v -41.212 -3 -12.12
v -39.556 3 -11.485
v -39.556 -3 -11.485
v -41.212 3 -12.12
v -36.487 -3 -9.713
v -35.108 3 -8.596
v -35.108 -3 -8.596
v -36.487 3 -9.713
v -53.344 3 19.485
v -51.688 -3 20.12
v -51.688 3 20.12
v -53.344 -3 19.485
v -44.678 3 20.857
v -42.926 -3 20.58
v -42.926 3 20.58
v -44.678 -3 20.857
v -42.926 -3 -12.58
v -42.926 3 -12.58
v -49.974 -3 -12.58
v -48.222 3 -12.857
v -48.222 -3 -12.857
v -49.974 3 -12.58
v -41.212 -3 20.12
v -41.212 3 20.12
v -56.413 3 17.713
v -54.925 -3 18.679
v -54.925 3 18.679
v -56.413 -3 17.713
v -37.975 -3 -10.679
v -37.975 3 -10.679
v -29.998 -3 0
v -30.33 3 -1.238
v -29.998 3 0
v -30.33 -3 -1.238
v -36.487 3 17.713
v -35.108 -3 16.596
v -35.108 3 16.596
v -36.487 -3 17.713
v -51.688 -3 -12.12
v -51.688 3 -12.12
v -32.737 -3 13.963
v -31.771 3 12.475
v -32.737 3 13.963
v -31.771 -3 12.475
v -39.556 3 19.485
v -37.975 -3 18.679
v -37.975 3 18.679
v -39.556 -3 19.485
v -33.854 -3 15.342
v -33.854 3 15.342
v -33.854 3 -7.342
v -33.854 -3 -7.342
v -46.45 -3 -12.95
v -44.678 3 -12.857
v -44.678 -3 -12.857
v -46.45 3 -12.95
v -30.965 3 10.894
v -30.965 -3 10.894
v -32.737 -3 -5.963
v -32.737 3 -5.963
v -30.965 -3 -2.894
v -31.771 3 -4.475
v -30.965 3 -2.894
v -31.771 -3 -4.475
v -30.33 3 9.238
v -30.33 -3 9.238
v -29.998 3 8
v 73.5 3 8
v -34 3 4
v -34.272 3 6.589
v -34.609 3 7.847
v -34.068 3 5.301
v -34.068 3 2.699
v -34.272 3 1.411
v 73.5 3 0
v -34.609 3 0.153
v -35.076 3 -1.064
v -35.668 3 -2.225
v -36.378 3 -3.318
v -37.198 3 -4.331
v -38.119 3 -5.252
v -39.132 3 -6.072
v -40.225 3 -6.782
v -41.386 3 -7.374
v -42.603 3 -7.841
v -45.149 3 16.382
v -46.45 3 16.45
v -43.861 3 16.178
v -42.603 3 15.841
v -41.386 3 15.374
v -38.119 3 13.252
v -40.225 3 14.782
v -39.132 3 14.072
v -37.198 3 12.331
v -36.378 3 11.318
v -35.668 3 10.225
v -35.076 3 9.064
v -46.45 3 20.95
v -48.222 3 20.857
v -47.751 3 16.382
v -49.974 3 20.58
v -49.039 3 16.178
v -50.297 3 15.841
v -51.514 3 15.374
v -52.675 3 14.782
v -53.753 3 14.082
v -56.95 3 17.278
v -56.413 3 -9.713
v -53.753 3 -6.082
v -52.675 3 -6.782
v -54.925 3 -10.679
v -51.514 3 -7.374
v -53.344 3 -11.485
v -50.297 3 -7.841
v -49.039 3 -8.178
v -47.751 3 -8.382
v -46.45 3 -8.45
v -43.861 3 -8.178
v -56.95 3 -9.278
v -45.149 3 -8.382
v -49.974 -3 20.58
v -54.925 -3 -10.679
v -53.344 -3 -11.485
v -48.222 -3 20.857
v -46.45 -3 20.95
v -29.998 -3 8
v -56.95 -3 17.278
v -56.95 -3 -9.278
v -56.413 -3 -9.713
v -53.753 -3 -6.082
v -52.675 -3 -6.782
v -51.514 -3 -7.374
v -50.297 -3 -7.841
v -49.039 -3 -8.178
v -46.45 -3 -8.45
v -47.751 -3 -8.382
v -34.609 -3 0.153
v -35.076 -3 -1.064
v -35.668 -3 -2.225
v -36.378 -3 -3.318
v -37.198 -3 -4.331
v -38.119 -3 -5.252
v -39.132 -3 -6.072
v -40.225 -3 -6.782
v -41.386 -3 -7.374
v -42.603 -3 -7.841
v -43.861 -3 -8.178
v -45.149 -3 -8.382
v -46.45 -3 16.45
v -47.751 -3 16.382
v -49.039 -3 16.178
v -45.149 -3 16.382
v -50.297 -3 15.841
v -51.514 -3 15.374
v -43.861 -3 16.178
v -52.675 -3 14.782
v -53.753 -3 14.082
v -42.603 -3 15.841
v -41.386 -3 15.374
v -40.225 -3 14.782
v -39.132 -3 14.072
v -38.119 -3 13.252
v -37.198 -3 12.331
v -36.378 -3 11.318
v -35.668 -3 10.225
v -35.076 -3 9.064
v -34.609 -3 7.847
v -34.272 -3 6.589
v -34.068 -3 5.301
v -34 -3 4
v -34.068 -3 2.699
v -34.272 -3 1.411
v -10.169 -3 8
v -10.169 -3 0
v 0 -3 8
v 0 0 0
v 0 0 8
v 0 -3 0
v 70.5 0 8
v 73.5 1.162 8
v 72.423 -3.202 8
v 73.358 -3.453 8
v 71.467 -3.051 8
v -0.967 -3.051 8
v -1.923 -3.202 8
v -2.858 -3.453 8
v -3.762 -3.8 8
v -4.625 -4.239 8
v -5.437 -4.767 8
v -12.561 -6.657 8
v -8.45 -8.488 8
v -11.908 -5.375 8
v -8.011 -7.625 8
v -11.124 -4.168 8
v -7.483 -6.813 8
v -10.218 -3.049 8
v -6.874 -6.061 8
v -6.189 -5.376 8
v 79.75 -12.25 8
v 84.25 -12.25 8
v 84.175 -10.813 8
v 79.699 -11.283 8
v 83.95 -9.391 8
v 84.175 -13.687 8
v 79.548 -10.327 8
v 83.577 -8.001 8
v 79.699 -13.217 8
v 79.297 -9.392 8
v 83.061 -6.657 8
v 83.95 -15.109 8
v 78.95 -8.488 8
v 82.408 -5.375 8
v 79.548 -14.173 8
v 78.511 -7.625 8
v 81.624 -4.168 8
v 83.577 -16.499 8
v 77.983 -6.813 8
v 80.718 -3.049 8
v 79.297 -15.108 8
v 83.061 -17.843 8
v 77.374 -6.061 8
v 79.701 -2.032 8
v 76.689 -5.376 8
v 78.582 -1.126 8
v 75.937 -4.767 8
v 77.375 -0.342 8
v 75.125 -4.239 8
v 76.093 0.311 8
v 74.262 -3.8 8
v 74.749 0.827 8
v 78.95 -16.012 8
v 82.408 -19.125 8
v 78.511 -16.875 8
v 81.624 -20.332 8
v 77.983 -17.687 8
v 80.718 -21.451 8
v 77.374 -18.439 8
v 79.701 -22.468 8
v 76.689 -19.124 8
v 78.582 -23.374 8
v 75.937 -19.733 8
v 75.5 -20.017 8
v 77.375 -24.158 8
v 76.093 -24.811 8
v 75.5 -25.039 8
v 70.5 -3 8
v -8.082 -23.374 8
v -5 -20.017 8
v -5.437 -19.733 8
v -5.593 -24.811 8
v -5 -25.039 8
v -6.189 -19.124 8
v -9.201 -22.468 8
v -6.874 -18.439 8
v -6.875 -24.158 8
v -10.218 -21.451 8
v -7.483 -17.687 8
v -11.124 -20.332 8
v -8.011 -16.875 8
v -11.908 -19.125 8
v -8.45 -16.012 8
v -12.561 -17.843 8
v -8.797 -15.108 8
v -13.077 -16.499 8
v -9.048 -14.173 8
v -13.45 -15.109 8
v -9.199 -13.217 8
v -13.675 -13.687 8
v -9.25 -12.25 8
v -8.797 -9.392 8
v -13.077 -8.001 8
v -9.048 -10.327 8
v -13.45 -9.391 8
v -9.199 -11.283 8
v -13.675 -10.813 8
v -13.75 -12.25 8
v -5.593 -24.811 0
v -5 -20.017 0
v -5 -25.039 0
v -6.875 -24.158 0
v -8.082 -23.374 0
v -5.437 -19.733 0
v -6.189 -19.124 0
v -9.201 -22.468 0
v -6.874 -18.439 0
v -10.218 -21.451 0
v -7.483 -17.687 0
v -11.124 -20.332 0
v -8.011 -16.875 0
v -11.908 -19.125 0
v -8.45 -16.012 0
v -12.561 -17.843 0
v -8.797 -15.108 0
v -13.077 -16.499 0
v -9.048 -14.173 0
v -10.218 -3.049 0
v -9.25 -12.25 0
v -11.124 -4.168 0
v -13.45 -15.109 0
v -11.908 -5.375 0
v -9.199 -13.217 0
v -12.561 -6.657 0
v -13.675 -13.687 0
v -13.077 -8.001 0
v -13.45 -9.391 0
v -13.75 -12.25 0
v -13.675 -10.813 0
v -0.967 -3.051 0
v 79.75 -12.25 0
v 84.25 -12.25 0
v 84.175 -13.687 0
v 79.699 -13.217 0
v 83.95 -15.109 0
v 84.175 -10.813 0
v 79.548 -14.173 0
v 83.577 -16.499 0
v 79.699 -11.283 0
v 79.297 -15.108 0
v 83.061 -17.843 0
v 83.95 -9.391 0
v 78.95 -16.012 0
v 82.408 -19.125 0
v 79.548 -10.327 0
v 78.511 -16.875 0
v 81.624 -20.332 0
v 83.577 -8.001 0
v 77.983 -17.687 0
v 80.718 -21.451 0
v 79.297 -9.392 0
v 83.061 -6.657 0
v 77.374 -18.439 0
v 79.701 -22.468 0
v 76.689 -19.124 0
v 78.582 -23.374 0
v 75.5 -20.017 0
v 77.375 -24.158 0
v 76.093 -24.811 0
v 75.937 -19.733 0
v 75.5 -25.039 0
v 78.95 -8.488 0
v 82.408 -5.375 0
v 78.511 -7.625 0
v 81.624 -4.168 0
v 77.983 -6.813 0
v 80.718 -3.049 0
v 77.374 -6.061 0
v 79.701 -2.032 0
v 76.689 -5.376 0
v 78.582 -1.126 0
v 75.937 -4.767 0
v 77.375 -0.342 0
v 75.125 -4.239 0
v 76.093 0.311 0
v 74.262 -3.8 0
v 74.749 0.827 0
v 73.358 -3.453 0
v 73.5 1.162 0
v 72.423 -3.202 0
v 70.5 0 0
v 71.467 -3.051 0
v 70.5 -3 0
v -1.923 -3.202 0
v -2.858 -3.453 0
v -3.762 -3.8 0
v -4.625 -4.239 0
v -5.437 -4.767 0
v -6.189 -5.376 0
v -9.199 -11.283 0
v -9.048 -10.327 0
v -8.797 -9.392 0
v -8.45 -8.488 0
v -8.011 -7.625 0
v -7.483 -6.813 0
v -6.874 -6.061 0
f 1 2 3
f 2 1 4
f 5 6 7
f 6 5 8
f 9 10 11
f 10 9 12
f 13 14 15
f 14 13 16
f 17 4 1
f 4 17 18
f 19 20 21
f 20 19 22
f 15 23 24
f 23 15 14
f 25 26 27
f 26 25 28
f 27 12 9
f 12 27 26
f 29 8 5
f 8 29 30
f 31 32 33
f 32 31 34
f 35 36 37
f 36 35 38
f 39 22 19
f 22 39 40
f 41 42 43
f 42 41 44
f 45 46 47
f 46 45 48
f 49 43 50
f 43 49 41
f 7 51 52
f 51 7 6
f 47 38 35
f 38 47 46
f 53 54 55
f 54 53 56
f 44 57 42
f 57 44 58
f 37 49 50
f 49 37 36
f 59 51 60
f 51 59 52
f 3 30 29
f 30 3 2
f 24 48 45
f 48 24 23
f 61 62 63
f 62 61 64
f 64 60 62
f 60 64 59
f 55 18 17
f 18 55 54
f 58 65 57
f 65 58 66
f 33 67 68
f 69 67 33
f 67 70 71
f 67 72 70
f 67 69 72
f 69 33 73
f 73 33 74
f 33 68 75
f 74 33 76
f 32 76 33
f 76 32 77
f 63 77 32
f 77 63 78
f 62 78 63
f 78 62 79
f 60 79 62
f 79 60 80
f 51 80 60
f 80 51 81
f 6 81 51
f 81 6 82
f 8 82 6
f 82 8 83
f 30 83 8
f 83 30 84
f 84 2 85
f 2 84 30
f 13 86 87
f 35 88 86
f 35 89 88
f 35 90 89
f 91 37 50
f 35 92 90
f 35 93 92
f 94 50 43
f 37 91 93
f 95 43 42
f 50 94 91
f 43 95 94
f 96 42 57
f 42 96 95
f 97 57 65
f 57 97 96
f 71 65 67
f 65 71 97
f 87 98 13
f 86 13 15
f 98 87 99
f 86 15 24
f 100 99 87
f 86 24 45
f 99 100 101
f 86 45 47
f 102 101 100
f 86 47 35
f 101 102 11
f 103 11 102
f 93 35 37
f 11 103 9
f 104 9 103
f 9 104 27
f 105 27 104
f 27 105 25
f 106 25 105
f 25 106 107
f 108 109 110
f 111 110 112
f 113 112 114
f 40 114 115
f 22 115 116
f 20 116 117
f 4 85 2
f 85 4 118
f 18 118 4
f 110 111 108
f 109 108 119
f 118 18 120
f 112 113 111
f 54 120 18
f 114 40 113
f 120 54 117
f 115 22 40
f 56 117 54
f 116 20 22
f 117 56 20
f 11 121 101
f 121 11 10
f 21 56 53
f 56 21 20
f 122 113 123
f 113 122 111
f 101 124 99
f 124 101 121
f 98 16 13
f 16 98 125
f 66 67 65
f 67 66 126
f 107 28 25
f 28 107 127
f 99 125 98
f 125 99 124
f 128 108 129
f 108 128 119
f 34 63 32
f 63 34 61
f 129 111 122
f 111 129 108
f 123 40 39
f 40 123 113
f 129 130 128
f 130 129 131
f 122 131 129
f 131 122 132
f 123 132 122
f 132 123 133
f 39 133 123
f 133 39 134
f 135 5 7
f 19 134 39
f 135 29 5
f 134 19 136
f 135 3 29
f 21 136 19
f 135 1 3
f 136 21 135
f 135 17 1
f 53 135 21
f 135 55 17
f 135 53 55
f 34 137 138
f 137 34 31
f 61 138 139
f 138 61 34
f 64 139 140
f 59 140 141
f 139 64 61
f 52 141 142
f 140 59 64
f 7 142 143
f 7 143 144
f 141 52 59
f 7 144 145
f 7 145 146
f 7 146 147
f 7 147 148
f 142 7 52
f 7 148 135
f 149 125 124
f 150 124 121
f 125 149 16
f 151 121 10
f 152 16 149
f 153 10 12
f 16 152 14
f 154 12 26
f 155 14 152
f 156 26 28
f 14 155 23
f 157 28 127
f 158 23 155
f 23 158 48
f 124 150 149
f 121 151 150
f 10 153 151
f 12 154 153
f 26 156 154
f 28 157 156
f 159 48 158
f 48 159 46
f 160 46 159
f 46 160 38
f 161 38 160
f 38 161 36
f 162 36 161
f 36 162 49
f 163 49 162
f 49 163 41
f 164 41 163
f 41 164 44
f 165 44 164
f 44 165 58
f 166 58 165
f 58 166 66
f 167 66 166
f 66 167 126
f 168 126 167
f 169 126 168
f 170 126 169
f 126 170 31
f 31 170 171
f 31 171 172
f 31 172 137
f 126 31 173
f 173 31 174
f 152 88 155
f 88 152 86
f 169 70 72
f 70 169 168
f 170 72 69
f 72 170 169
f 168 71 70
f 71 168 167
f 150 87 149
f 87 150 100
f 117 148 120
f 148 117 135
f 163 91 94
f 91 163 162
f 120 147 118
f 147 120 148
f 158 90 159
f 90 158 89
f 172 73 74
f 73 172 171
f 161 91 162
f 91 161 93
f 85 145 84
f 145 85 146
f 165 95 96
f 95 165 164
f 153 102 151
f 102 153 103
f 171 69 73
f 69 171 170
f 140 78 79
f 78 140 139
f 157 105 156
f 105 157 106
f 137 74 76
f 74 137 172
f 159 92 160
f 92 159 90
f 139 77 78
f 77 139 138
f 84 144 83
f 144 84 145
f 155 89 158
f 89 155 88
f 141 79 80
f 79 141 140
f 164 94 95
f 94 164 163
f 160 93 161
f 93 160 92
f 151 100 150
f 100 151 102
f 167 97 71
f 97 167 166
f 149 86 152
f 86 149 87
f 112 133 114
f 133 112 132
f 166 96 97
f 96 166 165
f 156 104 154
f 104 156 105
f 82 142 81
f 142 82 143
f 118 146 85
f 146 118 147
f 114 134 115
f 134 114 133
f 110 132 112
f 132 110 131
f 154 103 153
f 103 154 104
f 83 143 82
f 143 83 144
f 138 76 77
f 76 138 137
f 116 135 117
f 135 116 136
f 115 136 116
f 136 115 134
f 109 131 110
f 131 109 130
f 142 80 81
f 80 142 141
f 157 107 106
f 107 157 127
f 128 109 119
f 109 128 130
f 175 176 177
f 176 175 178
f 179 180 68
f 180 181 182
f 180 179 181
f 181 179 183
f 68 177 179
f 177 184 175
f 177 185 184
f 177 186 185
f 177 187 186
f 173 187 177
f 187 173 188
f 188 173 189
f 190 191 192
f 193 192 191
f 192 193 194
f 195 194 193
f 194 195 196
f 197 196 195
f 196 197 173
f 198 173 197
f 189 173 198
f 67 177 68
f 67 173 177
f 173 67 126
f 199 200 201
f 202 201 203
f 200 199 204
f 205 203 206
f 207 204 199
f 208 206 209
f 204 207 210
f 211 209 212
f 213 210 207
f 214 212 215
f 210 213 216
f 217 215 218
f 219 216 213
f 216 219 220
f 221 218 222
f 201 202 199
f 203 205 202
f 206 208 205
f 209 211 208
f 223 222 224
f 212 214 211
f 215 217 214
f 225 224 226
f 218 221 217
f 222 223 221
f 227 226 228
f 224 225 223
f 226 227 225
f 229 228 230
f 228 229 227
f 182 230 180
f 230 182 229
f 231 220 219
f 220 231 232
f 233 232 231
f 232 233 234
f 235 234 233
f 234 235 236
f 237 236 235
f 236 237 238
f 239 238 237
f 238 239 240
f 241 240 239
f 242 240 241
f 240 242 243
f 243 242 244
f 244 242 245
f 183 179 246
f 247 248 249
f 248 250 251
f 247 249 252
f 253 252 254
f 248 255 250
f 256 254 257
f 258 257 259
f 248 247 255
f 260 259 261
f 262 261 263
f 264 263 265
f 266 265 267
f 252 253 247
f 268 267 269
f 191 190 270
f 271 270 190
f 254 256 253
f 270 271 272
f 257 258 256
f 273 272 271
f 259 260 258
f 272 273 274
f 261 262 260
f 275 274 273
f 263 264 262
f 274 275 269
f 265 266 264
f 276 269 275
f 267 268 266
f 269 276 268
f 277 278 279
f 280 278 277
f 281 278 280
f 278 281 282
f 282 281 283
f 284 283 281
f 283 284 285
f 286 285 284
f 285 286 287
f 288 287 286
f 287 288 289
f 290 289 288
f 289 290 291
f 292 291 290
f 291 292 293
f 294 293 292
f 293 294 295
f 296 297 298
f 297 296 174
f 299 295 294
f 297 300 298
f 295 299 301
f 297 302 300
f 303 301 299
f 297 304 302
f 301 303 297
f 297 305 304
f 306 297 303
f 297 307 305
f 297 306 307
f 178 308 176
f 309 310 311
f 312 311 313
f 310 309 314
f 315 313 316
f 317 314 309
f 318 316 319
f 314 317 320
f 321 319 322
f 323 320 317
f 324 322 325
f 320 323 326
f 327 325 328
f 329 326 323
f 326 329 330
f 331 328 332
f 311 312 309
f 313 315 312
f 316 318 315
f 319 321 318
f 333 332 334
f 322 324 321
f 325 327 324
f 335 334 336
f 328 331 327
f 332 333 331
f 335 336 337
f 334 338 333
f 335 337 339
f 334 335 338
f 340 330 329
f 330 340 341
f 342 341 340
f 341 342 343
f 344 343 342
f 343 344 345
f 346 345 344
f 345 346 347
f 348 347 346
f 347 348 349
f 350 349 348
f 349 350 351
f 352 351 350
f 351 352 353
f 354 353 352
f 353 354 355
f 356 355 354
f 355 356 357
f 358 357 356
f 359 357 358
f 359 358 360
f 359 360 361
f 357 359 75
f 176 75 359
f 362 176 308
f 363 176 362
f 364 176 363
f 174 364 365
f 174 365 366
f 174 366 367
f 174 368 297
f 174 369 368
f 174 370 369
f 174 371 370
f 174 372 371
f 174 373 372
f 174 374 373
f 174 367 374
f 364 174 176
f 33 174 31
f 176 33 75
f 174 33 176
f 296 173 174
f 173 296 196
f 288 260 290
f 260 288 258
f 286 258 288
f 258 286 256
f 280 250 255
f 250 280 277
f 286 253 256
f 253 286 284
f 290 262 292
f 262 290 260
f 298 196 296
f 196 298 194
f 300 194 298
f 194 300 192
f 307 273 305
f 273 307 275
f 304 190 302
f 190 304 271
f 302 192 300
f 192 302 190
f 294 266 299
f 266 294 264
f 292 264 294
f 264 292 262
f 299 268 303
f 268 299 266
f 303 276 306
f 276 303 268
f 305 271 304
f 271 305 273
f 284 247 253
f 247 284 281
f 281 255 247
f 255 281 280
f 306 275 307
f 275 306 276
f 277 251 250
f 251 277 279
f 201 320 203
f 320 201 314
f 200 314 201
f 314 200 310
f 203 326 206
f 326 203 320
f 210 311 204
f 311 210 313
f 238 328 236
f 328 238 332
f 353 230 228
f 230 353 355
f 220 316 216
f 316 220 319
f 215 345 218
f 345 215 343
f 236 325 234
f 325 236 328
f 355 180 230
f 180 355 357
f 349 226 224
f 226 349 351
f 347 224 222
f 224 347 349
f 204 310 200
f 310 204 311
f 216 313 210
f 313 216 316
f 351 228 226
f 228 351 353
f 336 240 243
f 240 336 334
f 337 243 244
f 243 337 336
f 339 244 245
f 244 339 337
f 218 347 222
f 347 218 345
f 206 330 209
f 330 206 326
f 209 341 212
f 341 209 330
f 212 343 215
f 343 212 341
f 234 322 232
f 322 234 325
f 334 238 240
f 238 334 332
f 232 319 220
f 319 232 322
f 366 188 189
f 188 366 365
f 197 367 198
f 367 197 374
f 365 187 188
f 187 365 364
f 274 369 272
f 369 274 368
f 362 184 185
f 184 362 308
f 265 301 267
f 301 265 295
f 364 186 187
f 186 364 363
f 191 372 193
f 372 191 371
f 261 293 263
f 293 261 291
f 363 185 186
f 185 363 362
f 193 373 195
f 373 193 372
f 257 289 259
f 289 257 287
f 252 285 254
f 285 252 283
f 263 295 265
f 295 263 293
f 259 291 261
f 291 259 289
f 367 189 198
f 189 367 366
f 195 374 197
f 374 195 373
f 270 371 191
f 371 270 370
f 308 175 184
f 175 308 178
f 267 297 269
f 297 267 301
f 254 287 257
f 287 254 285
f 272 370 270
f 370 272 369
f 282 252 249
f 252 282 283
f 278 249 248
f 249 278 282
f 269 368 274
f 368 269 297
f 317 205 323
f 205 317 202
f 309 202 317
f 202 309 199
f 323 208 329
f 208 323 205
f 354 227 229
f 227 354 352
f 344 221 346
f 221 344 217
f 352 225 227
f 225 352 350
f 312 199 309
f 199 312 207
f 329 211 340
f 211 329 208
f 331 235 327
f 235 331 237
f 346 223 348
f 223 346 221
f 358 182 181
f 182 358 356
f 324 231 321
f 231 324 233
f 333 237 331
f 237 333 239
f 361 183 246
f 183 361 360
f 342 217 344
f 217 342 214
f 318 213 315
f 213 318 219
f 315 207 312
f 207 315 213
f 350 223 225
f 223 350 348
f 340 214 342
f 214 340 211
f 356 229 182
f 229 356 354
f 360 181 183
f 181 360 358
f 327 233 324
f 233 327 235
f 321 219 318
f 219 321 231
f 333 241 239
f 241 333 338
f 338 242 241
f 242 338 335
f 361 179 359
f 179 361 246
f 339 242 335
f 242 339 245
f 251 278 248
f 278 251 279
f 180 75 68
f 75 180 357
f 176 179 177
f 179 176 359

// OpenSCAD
thickness = 3;
depth = 8;
latch = 5;
arm = 28;
lights = 6;
//handle = 28.25; (broom w/rubber handle)
handle = 24.9;
$fn = 60;
// This is the arm/accessory section
translate([-(arm+lights),-thickness,0]){
//union(){
cube([arm+lights,2*thickness,depth]);
rotate([90,0,0]){
translate([-handle/2,depth/2,-2*thickness]){
difference(){
cylinder(d=handle+3*thickness, h= 2*thickness);
translate([0,0,-.5]){
cylinder(d=handle,h=2*thickness+1);
}

translate([-(handle+thickness+3),-(handle+thickness)/2,-.5]){
//cube([handle+thickness,handle+thickness,2*thickness+1]);
translate([(handle+thickness)/2,(handle+thickness)/2,0]){
rotate([0,0,45]){
translate([-(handle+thickness)/2,-(handle+thickness)/2,0]){
cube([handle+thickness,handle+thickness,2*thickness+1]);
}
}
}
}
}
}
}
//cylinder(d=lights+thickness,h=depth);
//}
//translate([0,0,-1]){
//cylinder(d=lights,h=depth+2);
//translate([0,0,0]){
//cube([3,10,depth+2]);
//}
//}
}

// This is the railing clip section
// This is top of clip
translate([-thickness,0,0]){
cube([70.5 + 2*(thickness),thickness, depth]);
}
// This is side arms of the clip
translate([0,-9.25 - 3,0]){
difference(){
union(){    
cylinder(d=18.5+3*(thickness),h=depth);
translate([70.5,0,0]){
cylinder(d=18.5+3*(thickness),h=depth);
}
}
translate([0,0,-1]){
cylinder(d=18.5,h=depth+2);
translate([70.5,0,0]){
cylinder(d=18.5,h=depth+2);
}
translate([0,-9.25-(1.5*thickness),0]){
cube([70.5,18.5+3*(thickness), depth + 2]);
}
translate([-latch,-(1.5*thickness + 9.25),0]){
cube([70.5+(2*latch),9.25+(1.5*thickness),depth + 2]);
}
}
}
}
